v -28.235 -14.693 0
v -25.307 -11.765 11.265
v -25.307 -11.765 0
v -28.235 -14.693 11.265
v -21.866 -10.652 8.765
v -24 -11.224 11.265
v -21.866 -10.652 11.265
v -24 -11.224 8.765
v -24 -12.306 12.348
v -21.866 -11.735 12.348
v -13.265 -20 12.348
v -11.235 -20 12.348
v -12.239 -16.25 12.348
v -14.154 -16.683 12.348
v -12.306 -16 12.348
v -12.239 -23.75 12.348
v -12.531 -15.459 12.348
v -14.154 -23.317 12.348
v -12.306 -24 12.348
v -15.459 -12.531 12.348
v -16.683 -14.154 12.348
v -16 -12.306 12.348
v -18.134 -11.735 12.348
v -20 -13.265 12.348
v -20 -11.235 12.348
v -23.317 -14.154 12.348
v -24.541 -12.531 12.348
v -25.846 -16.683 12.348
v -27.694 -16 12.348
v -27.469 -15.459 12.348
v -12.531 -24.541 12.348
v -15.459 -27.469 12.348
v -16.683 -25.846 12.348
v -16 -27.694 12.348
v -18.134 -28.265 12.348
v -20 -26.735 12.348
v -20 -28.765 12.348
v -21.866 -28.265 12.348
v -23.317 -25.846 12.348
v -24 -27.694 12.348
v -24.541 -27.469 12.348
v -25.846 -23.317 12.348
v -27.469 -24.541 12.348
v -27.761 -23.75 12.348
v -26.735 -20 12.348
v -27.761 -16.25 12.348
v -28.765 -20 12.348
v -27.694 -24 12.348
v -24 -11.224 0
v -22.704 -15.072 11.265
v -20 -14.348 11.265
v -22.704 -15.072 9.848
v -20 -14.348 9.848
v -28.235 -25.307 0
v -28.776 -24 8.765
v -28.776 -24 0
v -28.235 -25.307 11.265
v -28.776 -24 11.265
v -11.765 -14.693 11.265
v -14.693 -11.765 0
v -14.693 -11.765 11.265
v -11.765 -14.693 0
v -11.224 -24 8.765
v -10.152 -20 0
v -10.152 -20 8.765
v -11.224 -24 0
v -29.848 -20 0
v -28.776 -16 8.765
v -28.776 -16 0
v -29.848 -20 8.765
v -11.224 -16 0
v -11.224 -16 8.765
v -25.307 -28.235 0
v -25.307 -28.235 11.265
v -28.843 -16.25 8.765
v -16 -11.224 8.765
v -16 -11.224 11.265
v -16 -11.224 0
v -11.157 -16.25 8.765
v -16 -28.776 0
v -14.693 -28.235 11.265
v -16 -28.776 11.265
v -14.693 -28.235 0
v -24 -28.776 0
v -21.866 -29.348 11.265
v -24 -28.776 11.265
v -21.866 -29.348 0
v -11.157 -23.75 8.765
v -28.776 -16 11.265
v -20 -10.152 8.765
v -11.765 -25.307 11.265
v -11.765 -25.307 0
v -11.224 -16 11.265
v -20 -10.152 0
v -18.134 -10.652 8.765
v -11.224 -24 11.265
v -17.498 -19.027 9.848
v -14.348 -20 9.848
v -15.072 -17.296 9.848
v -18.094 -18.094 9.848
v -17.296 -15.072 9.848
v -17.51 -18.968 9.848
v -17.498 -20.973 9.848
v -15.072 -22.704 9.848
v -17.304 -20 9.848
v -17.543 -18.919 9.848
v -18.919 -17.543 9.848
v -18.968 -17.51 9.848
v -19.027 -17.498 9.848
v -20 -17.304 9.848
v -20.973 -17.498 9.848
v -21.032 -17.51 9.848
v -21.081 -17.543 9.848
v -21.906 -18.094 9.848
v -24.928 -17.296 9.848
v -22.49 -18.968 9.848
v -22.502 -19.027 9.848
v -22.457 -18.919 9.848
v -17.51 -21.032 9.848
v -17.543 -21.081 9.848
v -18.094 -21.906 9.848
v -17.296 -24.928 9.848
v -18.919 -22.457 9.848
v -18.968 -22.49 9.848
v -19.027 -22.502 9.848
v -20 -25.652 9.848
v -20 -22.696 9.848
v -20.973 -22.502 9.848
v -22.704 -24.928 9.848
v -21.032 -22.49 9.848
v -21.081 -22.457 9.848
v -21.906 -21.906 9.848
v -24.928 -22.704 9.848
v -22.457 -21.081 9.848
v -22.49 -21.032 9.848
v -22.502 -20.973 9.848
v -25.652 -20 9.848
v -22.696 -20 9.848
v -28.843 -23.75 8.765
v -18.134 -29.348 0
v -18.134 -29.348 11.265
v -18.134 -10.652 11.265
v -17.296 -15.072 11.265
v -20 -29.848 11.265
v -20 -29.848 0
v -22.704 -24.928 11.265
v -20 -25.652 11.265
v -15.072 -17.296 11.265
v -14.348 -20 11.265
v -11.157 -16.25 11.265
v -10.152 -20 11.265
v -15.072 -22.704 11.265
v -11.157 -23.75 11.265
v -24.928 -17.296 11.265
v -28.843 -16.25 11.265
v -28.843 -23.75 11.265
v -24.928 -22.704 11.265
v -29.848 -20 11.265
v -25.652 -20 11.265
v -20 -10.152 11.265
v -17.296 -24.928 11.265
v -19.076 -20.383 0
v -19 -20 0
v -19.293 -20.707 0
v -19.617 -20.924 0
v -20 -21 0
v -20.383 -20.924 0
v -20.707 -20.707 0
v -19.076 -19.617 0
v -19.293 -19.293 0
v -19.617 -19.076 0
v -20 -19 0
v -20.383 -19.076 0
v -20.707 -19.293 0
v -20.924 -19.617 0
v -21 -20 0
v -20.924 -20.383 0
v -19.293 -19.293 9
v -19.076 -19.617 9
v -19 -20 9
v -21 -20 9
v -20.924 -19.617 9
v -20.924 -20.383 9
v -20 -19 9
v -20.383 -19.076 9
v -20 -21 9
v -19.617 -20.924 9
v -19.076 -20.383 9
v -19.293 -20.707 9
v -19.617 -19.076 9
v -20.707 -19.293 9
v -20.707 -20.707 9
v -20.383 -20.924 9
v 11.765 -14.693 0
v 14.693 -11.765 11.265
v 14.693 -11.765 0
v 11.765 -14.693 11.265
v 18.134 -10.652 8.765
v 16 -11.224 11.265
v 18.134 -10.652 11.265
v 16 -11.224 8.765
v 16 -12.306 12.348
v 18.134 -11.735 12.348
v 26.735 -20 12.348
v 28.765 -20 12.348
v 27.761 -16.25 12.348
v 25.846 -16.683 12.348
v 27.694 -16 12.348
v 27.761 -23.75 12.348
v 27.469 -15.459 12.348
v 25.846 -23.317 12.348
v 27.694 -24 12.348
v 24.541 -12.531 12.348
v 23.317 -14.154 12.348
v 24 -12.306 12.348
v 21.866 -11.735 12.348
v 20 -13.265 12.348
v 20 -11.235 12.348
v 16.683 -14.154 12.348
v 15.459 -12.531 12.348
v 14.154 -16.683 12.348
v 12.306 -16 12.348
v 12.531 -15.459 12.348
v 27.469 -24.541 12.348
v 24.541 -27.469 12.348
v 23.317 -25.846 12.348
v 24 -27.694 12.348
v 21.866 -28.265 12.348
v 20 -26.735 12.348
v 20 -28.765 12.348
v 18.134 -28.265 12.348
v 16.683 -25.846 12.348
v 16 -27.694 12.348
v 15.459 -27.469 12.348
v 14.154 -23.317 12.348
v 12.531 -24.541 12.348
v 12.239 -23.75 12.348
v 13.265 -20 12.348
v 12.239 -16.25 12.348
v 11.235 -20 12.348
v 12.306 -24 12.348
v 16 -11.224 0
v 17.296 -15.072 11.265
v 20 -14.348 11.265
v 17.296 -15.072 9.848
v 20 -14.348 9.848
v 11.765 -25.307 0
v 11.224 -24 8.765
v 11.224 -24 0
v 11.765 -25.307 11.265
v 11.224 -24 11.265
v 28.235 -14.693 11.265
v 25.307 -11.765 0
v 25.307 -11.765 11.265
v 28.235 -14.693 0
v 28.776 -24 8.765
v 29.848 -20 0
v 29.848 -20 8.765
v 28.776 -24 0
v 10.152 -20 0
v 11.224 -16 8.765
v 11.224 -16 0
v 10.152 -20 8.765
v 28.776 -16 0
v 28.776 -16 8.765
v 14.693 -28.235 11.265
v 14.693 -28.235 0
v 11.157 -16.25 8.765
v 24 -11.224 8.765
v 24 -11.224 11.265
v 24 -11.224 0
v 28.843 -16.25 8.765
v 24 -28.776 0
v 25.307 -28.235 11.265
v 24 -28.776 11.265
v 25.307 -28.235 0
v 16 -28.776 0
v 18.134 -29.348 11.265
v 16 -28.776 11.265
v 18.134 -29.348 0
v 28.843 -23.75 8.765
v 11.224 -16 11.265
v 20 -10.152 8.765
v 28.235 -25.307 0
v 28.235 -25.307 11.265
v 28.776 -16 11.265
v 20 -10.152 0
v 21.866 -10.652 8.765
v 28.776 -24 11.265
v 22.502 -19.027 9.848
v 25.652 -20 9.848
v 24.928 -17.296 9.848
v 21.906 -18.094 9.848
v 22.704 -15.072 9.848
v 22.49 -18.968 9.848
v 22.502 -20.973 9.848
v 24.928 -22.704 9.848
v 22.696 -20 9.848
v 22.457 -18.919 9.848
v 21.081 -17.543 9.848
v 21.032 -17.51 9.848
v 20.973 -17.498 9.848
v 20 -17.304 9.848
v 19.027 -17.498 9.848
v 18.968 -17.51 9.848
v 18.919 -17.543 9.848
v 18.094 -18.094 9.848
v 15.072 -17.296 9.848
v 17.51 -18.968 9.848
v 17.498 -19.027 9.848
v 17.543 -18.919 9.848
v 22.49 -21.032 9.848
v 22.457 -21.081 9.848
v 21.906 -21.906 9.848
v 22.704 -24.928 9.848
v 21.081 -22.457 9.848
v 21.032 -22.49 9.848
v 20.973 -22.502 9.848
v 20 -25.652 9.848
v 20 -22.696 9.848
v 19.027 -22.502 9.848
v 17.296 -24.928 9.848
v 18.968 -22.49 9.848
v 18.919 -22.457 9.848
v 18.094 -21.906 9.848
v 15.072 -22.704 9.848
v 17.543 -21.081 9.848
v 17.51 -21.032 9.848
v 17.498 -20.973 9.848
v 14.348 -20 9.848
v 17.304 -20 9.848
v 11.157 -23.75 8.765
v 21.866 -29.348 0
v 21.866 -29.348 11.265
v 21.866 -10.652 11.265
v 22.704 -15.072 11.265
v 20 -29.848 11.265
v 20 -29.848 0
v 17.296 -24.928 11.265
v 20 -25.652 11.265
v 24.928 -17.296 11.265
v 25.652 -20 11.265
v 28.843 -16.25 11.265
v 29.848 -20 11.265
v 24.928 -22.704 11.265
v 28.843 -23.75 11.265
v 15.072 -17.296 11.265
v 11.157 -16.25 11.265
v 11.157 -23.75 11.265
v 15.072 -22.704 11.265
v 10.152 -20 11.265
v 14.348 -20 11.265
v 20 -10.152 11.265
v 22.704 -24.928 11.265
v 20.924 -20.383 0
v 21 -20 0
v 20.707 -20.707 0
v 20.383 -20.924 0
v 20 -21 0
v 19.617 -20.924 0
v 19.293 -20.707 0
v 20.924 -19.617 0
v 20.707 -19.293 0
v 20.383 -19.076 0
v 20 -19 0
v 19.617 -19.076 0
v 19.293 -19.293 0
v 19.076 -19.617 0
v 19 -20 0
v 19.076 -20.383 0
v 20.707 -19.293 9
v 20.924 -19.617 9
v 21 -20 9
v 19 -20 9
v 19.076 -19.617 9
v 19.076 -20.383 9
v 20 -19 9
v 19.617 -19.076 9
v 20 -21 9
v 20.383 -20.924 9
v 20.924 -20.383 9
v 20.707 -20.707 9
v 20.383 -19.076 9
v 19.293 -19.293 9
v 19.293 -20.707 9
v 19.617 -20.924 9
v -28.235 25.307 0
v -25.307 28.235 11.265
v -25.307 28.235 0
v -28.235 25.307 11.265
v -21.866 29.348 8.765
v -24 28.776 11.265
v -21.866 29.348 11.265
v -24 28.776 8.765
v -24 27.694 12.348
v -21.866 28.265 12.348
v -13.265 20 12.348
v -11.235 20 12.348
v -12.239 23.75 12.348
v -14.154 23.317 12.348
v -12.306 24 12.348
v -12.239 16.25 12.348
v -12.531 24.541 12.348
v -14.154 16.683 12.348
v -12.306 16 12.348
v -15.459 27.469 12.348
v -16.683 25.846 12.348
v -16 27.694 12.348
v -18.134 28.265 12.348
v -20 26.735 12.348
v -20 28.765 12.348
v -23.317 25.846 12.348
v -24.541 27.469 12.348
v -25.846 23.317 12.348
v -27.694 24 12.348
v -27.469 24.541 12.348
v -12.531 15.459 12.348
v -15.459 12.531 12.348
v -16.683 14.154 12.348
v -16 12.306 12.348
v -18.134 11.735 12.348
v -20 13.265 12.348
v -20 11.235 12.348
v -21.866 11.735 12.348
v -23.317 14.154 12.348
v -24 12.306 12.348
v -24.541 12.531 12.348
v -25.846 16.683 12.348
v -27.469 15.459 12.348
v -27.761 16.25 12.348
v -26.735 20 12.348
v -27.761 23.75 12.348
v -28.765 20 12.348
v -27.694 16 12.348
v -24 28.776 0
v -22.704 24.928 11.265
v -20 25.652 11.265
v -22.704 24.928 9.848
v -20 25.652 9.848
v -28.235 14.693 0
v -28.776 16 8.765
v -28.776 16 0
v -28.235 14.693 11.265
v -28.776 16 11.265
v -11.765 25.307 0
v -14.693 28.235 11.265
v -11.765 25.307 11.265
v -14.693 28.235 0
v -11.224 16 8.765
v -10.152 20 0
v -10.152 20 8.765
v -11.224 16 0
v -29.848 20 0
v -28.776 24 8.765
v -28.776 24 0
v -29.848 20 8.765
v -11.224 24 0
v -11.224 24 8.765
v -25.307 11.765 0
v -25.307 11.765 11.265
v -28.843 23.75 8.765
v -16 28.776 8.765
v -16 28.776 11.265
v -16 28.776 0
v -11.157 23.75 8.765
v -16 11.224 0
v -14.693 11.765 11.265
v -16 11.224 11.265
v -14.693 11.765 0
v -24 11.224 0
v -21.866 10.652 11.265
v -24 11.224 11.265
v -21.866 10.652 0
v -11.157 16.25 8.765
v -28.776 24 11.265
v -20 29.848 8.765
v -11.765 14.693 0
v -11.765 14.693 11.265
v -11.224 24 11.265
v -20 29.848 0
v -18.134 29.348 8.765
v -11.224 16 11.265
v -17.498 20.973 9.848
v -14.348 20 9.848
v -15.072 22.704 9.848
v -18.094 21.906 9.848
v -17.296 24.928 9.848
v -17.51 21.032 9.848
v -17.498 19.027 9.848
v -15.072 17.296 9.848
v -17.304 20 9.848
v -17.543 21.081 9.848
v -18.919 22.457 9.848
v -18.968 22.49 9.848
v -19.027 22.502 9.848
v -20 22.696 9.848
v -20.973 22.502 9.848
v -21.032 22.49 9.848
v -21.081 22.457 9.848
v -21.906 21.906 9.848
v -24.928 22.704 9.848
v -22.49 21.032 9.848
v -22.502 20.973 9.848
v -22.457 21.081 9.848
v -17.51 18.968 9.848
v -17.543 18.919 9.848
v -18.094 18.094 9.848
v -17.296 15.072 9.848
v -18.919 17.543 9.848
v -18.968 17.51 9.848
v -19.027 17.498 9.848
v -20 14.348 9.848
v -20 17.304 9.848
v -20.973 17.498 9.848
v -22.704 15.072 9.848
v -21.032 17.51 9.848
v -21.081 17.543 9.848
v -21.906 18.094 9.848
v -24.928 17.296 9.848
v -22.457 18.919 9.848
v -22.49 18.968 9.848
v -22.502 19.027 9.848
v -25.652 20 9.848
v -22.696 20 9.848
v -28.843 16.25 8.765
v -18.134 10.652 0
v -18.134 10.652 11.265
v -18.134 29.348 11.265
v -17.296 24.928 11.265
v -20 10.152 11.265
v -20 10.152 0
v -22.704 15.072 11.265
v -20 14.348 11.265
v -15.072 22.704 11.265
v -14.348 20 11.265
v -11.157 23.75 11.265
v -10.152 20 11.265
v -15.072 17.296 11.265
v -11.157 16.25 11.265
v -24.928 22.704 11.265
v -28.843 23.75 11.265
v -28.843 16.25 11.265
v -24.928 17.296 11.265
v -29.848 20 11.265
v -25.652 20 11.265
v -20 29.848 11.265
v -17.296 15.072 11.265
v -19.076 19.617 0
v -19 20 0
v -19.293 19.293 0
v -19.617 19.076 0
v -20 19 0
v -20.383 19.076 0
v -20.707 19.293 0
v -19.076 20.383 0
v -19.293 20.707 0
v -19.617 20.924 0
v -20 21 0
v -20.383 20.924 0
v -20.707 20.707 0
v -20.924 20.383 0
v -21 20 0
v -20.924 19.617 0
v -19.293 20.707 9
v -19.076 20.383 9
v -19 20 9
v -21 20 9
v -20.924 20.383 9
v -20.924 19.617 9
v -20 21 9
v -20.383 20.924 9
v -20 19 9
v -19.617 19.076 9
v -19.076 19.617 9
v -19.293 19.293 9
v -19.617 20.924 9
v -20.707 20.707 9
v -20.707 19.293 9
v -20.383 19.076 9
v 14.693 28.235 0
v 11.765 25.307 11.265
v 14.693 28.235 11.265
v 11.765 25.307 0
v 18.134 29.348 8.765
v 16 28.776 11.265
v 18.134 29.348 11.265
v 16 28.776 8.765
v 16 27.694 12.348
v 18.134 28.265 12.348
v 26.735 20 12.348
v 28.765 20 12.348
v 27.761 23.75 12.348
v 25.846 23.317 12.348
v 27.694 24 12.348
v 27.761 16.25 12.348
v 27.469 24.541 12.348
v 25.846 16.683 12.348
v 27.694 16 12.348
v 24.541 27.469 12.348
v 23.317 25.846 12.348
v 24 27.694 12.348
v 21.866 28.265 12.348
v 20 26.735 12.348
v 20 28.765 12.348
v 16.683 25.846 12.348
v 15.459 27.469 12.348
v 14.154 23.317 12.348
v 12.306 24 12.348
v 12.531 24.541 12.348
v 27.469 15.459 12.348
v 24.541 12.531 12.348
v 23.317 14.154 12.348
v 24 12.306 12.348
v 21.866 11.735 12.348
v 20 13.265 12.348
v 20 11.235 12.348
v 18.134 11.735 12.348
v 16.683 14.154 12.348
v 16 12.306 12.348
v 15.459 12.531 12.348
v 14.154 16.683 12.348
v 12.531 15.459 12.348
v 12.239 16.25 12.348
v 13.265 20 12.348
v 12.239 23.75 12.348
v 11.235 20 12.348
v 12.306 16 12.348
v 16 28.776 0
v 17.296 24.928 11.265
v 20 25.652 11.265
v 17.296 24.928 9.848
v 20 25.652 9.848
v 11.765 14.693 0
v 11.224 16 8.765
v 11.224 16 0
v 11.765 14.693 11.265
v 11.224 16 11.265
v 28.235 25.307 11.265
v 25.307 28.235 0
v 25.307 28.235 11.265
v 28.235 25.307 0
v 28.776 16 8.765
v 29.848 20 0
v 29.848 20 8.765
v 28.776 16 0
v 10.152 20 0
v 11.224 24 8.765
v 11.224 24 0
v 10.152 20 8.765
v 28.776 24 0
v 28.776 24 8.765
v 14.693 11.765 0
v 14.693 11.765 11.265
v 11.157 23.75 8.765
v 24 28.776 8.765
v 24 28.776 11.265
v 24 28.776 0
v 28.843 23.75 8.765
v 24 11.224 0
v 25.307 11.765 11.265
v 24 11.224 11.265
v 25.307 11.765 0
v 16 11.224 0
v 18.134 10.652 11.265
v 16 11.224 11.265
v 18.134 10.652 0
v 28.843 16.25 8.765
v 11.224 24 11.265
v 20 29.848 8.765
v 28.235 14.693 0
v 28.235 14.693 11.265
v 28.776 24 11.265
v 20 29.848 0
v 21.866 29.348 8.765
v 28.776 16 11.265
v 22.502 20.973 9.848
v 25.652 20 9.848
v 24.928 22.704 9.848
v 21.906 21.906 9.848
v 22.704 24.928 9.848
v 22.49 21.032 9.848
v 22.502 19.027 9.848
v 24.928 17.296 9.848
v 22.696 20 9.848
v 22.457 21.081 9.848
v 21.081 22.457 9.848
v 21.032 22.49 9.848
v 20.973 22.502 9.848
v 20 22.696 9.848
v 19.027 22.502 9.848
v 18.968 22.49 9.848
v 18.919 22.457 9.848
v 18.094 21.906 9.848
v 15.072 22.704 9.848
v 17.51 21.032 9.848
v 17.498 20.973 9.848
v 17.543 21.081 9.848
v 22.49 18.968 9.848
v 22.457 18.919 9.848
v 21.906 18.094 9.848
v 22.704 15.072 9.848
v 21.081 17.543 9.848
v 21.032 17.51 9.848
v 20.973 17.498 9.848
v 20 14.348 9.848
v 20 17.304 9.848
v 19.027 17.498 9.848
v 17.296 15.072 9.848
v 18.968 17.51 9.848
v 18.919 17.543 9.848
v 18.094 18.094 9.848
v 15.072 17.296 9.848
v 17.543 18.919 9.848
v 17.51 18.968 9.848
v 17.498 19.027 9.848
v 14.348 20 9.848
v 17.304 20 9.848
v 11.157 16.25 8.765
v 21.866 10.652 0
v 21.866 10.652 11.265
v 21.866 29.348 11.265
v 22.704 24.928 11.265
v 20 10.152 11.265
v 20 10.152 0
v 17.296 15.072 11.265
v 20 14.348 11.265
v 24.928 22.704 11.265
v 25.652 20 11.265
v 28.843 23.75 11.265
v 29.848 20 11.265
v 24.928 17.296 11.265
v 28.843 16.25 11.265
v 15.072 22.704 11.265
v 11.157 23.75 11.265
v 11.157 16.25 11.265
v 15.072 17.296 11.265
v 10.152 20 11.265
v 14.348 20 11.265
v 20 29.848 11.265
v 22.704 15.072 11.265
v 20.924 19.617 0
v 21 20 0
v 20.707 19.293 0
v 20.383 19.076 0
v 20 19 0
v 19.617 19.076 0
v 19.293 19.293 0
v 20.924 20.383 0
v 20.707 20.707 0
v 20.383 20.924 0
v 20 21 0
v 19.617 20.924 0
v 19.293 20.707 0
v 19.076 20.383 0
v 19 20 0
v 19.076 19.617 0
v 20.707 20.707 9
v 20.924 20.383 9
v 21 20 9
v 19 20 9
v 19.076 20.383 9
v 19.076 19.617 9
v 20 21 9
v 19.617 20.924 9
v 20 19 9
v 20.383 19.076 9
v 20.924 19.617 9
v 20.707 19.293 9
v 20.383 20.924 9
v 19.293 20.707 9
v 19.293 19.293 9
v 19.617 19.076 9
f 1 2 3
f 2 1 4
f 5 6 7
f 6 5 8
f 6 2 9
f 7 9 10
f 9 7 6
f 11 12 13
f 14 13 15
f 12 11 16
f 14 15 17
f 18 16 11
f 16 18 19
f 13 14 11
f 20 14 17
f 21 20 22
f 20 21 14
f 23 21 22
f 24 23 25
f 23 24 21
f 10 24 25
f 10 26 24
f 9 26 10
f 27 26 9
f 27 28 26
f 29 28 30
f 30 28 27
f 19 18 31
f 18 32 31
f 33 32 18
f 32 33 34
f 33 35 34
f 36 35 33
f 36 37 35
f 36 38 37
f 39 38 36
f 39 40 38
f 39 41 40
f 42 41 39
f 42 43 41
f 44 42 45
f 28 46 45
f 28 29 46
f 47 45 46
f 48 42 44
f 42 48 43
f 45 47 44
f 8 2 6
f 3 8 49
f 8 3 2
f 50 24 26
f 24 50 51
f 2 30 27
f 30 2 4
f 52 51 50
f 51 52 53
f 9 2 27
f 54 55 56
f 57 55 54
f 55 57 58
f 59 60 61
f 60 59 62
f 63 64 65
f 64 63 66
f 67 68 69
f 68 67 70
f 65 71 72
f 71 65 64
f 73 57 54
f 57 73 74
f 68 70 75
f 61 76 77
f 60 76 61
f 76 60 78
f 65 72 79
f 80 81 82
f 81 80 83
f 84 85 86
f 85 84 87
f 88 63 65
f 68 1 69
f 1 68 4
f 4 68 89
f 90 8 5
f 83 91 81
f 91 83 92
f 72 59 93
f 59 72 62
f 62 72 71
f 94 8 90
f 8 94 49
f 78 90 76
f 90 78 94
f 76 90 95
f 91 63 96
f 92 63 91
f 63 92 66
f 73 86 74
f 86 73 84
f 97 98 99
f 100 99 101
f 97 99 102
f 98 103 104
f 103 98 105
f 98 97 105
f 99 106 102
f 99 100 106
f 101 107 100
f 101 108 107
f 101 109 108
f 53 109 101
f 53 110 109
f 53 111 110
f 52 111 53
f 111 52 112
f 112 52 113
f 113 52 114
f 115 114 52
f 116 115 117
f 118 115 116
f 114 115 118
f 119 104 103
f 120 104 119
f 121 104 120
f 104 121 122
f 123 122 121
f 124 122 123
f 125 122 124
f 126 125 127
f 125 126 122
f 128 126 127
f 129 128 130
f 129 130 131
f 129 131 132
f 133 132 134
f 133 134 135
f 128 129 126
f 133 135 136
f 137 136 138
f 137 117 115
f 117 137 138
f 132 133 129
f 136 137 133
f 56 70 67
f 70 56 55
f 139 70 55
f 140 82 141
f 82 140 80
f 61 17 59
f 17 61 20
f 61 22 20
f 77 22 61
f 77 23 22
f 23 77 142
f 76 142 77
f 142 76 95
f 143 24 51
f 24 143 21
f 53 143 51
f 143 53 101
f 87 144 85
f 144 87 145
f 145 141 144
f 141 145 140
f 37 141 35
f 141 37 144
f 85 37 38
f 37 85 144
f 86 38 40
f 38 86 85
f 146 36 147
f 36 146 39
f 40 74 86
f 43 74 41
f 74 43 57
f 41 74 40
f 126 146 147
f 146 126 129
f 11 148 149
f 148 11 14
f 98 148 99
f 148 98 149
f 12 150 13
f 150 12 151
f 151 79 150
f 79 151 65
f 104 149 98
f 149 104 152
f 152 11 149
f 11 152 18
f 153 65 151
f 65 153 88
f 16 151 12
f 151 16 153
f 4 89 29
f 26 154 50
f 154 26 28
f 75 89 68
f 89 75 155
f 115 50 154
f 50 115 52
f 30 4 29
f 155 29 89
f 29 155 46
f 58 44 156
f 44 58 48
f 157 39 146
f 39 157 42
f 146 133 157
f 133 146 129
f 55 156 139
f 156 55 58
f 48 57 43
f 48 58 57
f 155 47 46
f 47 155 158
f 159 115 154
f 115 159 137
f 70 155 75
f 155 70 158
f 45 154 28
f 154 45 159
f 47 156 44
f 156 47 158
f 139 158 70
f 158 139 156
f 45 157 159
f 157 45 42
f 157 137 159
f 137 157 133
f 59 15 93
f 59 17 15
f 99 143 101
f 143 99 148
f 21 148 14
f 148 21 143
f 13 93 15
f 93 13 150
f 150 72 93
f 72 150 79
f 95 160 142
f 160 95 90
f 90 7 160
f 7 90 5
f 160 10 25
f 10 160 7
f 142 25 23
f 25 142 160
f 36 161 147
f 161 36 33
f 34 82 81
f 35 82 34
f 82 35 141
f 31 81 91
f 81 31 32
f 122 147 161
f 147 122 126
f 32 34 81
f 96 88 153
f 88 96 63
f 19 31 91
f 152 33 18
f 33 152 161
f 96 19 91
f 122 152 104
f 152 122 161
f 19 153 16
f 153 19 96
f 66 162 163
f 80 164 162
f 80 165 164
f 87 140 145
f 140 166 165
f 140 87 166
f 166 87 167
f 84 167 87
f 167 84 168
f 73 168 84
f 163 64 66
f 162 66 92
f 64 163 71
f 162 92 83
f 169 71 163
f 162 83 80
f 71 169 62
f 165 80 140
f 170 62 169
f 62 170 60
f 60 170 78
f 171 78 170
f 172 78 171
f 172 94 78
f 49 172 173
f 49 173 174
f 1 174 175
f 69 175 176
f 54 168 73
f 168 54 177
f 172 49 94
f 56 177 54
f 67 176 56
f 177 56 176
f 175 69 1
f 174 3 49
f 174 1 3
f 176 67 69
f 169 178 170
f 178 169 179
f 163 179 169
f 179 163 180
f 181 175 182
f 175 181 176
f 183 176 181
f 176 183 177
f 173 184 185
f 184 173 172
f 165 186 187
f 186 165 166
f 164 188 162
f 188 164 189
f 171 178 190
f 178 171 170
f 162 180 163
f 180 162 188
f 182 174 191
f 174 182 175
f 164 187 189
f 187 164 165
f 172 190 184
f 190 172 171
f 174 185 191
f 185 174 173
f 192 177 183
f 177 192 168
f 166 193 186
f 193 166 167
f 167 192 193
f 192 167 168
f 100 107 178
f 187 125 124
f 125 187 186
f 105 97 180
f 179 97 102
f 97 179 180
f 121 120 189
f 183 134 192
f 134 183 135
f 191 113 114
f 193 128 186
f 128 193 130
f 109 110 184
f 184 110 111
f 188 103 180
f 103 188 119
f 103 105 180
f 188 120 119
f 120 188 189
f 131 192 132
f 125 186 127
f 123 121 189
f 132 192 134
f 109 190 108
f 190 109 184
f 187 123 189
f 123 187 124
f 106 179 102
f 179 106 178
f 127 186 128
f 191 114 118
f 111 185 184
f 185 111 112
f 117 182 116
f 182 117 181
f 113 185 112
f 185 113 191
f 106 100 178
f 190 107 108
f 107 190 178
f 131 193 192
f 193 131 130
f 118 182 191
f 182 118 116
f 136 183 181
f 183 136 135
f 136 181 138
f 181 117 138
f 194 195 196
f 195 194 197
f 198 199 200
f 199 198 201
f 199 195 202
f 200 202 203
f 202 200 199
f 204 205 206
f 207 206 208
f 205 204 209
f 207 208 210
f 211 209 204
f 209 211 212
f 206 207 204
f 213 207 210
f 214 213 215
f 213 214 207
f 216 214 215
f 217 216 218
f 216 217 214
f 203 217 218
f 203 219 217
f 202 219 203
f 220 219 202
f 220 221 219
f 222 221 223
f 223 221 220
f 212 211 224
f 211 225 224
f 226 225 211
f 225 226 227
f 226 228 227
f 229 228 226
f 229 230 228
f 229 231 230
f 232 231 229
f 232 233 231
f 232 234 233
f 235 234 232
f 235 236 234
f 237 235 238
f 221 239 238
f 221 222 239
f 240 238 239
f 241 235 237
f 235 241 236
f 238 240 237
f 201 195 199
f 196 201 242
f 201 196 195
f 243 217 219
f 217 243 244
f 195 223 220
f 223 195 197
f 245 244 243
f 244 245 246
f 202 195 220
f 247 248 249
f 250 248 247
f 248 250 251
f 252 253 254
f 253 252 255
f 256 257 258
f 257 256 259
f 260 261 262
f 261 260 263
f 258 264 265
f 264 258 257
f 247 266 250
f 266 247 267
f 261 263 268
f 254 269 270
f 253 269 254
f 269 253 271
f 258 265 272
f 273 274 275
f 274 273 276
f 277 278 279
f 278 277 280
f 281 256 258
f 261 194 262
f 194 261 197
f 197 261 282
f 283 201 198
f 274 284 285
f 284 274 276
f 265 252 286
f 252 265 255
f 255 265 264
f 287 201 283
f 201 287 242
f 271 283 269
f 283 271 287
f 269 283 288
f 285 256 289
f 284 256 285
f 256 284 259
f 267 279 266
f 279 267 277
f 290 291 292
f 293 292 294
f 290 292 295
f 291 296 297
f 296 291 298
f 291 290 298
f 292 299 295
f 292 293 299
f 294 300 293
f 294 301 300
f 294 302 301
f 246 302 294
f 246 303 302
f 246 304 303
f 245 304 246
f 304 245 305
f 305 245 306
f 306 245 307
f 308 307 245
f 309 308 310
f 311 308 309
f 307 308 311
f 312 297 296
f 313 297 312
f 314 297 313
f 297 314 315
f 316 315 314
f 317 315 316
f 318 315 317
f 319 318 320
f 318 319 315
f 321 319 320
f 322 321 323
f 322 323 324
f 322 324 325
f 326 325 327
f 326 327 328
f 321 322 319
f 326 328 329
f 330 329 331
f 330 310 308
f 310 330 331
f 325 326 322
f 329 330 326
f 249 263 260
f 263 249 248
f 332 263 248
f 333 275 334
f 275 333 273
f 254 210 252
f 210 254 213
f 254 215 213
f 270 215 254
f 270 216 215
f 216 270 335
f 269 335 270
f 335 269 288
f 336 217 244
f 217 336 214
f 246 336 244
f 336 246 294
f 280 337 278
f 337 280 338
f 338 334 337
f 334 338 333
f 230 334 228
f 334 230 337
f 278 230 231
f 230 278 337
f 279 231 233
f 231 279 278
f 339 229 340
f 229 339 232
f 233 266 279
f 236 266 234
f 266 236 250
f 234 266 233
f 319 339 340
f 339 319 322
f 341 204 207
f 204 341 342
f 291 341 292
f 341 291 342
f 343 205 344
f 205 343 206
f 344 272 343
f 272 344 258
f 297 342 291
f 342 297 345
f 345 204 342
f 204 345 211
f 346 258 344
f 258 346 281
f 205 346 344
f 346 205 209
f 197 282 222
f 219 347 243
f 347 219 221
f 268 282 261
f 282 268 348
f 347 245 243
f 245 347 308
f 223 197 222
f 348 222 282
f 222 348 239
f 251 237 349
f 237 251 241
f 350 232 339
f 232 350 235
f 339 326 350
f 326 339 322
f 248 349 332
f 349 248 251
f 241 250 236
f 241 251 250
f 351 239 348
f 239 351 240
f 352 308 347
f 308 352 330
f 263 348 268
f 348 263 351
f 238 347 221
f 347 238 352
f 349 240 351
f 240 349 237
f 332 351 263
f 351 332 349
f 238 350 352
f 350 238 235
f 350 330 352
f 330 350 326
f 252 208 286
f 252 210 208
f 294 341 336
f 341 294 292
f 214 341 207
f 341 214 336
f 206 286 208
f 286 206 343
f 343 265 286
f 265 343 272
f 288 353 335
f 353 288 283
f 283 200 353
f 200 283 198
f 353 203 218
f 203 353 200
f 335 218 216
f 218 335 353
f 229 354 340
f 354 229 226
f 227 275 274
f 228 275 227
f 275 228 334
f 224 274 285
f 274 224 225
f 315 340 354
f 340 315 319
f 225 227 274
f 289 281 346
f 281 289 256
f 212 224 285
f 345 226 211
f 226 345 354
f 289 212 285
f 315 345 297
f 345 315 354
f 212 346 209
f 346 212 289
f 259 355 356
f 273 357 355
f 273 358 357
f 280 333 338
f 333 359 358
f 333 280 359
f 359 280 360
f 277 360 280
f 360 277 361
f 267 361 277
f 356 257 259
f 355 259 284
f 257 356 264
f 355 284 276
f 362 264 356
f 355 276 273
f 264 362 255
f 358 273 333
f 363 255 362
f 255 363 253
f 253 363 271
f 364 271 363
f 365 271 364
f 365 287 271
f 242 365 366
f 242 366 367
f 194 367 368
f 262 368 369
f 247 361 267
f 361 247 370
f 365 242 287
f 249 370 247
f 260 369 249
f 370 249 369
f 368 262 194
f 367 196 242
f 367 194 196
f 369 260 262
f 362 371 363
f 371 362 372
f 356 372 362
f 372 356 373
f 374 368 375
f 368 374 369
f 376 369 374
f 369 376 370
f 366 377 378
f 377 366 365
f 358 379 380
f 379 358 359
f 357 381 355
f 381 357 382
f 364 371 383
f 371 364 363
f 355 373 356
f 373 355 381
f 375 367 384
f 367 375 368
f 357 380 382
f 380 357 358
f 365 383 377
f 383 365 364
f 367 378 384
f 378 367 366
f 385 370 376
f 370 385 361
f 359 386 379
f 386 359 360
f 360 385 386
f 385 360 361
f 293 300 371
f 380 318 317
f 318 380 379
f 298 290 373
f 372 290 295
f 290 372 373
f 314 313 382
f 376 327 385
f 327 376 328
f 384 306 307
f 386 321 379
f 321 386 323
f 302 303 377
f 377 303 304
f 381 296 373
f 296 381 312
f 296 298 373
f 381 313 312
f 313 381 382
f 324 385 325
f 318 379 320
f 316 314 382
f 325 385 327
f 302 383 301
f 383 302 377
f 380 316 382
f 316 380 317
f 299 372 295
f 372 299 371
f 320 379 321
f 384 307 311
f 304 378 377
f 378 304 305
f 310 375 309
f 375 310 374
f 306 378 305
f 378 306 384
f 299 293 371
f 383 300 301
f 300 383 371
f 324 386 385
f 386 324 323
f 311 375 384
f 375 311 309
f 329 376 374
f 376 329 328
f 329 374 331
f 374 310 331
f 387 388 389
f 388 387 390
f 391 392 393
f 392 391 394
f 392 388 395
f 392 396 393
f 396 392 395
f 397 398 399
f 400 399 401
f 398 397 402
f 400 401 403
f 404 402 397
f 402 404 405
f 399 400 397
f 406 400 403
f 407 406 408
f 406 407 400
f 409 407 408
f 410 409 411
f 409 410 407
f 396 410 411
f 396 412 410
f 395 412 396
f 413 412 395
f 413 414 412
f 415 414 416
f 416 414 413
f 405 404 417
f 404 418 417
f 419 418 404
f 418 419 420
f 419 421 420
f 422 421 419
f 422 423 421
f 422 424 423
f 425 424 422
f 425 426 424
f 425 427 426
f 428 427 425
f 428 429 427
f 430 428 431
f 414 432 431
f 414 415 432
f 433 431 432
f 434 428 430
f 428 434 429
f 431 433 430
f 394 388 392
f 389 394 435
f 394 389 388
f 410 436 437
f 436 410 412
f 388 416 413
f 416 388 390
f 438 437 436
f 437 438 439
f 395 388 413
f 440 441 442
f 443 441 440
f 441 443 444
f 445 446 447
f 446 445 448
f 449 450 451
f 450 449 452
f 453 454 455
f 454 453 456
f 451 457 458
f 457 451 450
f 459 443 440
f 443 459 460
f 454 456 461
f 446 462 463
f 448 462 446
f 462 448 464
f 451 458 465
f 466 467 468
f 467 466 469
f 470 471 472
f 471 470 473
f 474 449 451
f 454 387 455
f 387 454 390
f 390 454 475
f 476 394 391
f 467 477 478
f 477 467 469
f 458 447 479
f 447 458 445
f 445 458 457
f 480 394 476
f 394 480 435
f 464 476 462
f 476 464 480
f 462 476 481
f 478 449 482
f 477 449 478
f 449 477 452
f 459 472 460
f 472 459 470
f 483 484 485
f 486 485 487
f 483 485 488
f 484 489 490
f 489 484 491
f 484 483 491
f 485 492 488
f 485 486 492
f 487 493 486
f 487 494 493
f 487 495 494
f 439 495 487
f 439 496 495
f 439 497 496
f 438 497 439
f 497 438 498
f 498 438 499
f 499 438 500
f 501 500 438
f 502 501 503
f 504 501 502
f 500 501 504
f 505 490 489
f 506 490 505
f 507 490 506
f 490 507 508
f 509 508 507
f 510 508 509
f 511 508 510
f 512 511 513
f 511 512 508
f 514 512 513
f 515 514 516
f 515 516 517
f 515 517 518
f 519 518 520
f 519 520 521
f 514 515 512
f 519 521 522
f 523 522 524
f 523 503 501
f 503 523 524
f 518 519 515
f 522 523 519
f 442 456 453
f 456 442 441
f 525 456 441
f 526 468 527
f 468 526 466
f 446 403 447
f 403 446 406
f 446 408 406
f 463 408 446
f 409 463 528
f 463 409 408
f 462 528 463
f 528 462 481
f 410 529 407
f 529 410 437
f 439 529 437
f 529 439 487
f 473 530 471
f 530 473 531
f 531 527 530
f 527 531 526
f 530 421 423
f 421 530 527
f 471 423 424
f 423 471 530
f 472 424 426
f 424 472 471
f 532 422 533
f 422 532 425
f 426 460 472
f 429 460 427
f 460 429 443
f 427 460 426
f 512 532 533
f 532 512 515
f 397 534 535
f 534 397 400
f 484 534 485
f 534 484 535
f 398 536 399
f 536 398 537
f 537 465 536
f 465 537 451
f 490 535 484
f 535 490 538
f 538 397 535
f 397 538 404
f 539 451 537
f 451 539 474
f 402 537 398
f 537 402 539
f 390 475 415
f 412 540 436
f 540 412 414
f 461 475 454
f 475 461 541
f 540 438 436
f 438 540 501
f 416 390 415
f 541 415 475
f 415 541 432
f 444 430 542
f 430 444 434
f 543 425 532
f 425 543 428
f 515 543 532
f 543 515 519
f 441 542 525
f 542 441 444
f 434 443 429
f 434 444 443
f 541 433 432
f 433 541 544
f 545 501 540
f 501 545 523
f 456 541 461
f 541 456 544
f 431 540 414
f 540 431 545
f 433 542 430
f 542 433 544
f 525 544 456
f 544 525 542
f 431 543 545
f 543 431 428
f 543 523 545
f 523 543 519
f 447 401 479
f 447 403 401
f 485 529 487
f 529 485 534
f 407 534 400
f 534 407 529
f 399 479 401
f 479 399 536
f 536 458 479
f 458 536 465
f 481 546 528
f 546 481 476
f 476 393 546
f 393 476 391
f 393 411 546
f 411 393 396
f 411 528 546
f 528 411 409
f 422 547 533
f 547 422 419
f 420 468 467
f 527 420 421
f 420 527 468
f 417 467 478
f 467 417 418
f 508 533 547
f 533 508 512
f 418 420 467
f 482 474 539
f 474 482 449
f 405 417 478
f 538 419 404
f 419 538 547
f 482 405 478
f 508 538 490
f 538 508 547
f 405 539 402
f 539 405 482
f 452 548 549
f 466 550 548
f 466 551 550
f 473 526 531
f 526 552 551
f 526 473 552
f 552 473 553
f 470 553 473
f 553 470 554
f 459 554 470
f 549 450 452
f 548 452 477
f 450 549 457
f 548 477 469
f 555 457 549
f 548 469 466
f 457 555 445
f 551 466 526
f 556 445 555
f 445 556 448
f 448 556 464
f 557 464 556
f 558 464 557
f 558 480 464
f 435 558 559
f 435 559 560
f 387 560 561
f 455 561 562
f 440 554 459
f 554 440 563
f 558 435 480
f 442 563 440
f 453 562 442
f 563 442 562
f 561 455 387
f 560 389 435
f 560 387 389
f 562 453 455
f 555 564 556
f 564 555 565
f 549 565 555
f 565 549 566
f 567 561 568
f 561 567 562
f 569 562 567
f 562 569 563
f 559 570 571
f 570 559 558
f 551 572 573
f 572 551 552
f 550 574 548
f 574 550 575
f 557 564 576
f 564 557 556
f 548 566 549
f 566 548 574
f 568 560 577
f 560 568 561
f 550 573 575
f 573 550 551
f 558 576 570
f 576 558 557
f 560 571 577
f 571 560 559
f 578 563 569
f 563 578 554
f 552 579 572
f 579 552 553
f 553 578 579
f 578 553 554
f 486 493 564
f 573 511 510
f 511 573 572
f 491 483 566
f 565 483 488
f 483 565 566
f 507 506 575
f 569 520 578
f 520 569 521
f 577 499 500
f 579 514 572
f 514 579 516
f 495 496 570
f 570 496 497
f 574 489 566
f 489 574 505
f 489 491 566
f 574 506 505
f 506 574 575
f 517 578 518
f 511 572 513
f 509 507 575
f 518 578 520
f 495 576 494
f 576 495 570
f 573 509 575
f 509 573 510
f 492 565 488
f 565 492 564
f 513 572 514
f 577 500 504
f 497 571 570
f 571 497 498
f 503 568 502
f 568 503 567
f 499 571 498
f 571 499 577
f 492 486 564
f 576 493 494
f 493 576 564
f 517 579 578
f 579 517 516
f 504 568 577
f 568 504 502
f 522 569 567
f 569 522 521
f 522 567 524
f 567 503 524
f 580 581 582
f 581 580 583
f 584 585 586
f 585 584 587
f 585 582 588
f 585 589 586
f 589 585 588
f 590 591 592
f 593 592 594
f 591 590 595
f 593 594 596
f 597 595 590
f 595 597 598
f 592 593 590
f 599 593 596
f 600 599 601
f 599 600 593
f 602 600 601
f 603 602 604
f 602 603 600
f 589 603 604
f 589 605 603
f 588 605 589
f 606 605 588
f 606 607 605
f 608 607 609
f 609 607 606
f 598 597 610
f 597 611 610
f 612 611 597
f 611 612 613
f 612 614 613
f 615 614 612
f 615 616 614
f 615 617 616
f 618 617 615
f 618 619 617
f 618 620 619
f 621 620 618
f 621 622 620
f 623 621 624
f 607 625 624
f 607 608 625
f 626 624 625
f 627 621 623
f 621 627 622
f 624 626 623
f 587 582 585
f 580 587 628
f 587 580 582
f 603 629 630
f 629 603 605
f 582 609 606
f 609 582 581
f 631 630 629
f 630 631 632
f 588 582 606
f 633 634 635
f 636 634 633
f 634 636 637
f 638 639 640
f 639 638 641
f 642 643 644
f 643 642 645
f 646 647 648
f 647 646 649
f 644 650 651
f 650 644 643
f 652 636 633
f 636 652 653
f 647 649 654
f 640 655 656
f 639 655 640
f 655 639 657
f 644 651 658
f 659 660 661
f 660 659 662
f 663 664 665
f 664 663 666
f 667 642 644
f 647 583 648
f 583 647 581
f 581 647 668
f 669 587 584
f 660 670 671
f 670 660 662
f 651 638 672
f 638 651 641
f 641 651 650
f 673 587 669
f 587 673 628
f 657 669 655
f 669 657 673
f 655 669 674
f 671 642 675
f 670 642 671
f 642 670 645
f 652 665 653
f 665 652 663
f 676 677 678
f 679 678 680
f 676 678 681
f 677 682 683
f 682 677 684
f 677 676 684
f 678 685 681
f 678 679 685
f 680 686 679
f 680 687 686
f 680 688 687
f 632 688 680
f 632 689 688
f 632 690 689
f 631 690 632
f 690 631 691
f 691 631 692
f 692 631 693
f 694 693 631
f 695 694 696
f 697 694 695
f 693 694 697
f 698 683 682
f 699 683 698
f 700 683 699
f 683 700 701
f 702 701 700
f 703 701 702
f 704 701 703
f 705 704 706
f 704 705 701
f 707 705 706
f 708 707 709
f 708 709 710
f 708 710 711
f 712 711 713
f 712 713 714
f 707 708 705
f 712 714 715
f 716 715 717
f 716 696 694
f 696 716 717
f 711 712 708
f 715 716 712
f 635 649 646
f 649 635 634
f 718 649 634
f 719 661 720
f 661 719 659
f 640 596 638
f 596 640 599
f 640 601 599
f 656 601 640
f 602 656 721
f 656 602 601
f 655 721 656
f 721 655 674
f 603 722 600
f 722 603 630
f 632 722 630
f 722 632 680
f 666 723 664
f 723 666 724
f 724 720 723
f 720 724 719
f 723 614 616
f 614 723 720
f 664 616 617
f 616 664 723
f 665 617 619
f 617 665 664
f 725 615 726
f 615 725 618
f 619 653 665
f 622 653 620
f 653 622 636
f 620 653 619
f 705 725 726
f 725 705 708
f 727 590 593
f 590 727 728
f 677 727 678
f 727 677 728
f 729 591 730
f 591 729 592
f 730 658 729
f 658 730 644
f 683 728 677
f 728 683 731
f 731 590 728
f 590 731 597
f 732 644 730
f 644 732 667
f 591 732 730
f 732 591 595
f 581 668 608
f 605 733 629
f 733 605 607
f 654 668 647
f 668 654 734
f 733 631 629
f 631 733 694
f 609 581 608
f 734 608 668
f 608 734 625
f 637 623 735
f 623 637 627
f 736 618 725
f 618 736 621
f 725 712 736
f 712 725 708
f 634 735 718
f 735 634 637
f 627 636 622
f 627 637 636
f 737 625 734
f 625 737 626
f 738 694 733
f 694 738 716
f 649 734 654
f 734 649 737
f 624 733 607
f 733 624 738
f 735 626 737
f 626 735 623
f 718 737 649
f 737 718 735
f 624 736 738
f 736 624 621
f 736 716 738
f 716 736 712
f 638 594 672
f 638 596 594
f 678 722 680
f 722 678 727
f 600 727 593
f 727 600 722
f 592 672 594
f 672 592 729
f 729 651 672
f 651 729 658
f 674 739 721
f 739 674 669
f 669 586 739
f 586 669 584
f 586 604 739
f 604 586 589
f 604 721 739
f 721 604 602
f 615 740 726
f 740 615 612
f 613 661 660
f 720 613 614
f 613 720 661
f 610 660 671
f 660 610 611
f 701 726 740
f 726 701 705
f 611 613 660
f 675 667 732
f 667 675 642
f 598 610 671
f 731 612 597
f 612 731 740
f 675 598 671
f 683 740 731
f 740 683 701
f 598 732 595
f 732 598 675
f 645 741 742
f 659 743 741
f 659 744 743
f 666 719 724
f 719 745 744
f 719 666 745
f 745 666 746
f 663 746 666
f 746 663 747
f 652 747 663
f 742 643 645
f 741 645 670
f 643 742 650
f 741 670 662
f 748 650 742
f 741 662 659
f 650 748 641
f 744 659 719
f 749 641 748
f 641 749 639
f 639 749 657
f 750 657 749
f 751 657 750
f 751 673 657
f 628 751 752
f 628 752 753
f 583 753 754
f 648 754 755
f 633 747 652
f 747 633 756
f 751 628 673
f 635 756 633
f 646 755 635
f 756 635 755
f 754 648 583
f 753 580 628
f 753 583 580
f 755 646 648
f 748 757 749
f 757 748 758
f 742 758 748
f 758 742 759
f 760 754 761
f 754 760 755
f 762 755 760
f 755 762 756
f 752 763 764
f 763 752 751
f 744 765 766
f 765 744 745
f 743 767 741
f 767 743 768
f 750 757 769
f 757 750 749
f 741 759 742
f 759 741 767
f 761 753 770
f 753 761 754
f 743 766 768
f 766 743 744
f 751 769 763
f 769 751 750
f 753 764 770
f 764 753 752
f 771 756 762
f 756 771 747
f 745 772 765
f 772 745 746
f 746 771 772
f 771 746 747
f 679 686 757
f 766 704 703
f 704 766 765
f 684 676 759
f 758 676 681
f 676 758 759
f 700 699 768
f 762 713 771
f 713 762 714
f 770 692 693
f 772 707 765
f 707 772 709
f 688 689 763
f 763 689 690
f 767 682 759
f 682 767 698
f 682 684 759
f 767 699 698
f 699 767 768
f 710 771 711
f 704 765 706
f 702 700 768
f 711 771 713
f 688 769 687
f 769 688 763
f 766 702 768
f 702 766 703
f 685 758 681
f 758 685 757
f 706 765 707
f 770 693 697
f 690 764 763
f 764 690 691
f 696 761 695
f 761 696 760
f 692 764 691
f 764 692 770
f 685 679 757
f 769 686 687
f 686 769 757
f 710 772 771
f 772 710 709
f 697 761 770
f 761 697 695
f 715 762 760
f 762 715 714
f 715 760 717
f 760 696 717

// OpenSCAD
// file: Defines_v1.scad
/* spacing between the leds
 * usually around 12, can be forced
 * to 6-10 by bending strip
 */
space = 6;  

/* some space for the outermost leds
 * for better viewing angle
 */
margin = 10;

/* 15 leds (type 5050) with above spacing */
width = 15 * (5 + space) + 10 + 2 * margin;

/* box height, min. 42mm */
height = 47;

/* box depth, min 100mm for 4x3-keypad */
depth = 105;

/* max wall thickness */
thick=10;

/* grade of feet smoothness
 * below 10 looks bad
 * 10-16 is reasonable
 * above 16 takes much time to render
 */
grade = 12;

/* length of side stands 
 * should be enough to get box in right angle
 * should not exceed back of box
 */
stand = min(height + 20, depth - 40);

/* offset of usb plug from center */
usb_offs = 60;

/* calculated values */
bwidth = width + 14;
bheight = depth + 7;

/* size of led holes 
 * includes some margin for 5050 leds
 */
led = 5.75;

minimal = 1;
// main file
include <Defines_v1.scad>;

module Fuss() {
    difference() {
        translate([0,0,5.5]) minkowski() {
            difference() {
                cylinder(10, 8, 8, $fn = grade, center = true);
                translate([0,0,5])
                    cylinder(5, 7.5, 7.5, $fn = grade, center = true);
            }
            sphere(2, $fn=8);
        }
        translate([0,0,-1.5]) 
            cube([20,20,3], center = true);
        translate([0, 0, 5]) 
            cylinder(10.1, 1, 1, $fn = 16, center = true);
        translate([0, 0, 9.5]) 
            cylinder(1, 1, 3, $fn = 16, center = true);
    }
}

translate([-20,-20,0]) Fuss();
translate([20,-20,0]) Fuss();
translate([-20,20,0]) Fuss();
translate([20,20,0]) Fuss();
